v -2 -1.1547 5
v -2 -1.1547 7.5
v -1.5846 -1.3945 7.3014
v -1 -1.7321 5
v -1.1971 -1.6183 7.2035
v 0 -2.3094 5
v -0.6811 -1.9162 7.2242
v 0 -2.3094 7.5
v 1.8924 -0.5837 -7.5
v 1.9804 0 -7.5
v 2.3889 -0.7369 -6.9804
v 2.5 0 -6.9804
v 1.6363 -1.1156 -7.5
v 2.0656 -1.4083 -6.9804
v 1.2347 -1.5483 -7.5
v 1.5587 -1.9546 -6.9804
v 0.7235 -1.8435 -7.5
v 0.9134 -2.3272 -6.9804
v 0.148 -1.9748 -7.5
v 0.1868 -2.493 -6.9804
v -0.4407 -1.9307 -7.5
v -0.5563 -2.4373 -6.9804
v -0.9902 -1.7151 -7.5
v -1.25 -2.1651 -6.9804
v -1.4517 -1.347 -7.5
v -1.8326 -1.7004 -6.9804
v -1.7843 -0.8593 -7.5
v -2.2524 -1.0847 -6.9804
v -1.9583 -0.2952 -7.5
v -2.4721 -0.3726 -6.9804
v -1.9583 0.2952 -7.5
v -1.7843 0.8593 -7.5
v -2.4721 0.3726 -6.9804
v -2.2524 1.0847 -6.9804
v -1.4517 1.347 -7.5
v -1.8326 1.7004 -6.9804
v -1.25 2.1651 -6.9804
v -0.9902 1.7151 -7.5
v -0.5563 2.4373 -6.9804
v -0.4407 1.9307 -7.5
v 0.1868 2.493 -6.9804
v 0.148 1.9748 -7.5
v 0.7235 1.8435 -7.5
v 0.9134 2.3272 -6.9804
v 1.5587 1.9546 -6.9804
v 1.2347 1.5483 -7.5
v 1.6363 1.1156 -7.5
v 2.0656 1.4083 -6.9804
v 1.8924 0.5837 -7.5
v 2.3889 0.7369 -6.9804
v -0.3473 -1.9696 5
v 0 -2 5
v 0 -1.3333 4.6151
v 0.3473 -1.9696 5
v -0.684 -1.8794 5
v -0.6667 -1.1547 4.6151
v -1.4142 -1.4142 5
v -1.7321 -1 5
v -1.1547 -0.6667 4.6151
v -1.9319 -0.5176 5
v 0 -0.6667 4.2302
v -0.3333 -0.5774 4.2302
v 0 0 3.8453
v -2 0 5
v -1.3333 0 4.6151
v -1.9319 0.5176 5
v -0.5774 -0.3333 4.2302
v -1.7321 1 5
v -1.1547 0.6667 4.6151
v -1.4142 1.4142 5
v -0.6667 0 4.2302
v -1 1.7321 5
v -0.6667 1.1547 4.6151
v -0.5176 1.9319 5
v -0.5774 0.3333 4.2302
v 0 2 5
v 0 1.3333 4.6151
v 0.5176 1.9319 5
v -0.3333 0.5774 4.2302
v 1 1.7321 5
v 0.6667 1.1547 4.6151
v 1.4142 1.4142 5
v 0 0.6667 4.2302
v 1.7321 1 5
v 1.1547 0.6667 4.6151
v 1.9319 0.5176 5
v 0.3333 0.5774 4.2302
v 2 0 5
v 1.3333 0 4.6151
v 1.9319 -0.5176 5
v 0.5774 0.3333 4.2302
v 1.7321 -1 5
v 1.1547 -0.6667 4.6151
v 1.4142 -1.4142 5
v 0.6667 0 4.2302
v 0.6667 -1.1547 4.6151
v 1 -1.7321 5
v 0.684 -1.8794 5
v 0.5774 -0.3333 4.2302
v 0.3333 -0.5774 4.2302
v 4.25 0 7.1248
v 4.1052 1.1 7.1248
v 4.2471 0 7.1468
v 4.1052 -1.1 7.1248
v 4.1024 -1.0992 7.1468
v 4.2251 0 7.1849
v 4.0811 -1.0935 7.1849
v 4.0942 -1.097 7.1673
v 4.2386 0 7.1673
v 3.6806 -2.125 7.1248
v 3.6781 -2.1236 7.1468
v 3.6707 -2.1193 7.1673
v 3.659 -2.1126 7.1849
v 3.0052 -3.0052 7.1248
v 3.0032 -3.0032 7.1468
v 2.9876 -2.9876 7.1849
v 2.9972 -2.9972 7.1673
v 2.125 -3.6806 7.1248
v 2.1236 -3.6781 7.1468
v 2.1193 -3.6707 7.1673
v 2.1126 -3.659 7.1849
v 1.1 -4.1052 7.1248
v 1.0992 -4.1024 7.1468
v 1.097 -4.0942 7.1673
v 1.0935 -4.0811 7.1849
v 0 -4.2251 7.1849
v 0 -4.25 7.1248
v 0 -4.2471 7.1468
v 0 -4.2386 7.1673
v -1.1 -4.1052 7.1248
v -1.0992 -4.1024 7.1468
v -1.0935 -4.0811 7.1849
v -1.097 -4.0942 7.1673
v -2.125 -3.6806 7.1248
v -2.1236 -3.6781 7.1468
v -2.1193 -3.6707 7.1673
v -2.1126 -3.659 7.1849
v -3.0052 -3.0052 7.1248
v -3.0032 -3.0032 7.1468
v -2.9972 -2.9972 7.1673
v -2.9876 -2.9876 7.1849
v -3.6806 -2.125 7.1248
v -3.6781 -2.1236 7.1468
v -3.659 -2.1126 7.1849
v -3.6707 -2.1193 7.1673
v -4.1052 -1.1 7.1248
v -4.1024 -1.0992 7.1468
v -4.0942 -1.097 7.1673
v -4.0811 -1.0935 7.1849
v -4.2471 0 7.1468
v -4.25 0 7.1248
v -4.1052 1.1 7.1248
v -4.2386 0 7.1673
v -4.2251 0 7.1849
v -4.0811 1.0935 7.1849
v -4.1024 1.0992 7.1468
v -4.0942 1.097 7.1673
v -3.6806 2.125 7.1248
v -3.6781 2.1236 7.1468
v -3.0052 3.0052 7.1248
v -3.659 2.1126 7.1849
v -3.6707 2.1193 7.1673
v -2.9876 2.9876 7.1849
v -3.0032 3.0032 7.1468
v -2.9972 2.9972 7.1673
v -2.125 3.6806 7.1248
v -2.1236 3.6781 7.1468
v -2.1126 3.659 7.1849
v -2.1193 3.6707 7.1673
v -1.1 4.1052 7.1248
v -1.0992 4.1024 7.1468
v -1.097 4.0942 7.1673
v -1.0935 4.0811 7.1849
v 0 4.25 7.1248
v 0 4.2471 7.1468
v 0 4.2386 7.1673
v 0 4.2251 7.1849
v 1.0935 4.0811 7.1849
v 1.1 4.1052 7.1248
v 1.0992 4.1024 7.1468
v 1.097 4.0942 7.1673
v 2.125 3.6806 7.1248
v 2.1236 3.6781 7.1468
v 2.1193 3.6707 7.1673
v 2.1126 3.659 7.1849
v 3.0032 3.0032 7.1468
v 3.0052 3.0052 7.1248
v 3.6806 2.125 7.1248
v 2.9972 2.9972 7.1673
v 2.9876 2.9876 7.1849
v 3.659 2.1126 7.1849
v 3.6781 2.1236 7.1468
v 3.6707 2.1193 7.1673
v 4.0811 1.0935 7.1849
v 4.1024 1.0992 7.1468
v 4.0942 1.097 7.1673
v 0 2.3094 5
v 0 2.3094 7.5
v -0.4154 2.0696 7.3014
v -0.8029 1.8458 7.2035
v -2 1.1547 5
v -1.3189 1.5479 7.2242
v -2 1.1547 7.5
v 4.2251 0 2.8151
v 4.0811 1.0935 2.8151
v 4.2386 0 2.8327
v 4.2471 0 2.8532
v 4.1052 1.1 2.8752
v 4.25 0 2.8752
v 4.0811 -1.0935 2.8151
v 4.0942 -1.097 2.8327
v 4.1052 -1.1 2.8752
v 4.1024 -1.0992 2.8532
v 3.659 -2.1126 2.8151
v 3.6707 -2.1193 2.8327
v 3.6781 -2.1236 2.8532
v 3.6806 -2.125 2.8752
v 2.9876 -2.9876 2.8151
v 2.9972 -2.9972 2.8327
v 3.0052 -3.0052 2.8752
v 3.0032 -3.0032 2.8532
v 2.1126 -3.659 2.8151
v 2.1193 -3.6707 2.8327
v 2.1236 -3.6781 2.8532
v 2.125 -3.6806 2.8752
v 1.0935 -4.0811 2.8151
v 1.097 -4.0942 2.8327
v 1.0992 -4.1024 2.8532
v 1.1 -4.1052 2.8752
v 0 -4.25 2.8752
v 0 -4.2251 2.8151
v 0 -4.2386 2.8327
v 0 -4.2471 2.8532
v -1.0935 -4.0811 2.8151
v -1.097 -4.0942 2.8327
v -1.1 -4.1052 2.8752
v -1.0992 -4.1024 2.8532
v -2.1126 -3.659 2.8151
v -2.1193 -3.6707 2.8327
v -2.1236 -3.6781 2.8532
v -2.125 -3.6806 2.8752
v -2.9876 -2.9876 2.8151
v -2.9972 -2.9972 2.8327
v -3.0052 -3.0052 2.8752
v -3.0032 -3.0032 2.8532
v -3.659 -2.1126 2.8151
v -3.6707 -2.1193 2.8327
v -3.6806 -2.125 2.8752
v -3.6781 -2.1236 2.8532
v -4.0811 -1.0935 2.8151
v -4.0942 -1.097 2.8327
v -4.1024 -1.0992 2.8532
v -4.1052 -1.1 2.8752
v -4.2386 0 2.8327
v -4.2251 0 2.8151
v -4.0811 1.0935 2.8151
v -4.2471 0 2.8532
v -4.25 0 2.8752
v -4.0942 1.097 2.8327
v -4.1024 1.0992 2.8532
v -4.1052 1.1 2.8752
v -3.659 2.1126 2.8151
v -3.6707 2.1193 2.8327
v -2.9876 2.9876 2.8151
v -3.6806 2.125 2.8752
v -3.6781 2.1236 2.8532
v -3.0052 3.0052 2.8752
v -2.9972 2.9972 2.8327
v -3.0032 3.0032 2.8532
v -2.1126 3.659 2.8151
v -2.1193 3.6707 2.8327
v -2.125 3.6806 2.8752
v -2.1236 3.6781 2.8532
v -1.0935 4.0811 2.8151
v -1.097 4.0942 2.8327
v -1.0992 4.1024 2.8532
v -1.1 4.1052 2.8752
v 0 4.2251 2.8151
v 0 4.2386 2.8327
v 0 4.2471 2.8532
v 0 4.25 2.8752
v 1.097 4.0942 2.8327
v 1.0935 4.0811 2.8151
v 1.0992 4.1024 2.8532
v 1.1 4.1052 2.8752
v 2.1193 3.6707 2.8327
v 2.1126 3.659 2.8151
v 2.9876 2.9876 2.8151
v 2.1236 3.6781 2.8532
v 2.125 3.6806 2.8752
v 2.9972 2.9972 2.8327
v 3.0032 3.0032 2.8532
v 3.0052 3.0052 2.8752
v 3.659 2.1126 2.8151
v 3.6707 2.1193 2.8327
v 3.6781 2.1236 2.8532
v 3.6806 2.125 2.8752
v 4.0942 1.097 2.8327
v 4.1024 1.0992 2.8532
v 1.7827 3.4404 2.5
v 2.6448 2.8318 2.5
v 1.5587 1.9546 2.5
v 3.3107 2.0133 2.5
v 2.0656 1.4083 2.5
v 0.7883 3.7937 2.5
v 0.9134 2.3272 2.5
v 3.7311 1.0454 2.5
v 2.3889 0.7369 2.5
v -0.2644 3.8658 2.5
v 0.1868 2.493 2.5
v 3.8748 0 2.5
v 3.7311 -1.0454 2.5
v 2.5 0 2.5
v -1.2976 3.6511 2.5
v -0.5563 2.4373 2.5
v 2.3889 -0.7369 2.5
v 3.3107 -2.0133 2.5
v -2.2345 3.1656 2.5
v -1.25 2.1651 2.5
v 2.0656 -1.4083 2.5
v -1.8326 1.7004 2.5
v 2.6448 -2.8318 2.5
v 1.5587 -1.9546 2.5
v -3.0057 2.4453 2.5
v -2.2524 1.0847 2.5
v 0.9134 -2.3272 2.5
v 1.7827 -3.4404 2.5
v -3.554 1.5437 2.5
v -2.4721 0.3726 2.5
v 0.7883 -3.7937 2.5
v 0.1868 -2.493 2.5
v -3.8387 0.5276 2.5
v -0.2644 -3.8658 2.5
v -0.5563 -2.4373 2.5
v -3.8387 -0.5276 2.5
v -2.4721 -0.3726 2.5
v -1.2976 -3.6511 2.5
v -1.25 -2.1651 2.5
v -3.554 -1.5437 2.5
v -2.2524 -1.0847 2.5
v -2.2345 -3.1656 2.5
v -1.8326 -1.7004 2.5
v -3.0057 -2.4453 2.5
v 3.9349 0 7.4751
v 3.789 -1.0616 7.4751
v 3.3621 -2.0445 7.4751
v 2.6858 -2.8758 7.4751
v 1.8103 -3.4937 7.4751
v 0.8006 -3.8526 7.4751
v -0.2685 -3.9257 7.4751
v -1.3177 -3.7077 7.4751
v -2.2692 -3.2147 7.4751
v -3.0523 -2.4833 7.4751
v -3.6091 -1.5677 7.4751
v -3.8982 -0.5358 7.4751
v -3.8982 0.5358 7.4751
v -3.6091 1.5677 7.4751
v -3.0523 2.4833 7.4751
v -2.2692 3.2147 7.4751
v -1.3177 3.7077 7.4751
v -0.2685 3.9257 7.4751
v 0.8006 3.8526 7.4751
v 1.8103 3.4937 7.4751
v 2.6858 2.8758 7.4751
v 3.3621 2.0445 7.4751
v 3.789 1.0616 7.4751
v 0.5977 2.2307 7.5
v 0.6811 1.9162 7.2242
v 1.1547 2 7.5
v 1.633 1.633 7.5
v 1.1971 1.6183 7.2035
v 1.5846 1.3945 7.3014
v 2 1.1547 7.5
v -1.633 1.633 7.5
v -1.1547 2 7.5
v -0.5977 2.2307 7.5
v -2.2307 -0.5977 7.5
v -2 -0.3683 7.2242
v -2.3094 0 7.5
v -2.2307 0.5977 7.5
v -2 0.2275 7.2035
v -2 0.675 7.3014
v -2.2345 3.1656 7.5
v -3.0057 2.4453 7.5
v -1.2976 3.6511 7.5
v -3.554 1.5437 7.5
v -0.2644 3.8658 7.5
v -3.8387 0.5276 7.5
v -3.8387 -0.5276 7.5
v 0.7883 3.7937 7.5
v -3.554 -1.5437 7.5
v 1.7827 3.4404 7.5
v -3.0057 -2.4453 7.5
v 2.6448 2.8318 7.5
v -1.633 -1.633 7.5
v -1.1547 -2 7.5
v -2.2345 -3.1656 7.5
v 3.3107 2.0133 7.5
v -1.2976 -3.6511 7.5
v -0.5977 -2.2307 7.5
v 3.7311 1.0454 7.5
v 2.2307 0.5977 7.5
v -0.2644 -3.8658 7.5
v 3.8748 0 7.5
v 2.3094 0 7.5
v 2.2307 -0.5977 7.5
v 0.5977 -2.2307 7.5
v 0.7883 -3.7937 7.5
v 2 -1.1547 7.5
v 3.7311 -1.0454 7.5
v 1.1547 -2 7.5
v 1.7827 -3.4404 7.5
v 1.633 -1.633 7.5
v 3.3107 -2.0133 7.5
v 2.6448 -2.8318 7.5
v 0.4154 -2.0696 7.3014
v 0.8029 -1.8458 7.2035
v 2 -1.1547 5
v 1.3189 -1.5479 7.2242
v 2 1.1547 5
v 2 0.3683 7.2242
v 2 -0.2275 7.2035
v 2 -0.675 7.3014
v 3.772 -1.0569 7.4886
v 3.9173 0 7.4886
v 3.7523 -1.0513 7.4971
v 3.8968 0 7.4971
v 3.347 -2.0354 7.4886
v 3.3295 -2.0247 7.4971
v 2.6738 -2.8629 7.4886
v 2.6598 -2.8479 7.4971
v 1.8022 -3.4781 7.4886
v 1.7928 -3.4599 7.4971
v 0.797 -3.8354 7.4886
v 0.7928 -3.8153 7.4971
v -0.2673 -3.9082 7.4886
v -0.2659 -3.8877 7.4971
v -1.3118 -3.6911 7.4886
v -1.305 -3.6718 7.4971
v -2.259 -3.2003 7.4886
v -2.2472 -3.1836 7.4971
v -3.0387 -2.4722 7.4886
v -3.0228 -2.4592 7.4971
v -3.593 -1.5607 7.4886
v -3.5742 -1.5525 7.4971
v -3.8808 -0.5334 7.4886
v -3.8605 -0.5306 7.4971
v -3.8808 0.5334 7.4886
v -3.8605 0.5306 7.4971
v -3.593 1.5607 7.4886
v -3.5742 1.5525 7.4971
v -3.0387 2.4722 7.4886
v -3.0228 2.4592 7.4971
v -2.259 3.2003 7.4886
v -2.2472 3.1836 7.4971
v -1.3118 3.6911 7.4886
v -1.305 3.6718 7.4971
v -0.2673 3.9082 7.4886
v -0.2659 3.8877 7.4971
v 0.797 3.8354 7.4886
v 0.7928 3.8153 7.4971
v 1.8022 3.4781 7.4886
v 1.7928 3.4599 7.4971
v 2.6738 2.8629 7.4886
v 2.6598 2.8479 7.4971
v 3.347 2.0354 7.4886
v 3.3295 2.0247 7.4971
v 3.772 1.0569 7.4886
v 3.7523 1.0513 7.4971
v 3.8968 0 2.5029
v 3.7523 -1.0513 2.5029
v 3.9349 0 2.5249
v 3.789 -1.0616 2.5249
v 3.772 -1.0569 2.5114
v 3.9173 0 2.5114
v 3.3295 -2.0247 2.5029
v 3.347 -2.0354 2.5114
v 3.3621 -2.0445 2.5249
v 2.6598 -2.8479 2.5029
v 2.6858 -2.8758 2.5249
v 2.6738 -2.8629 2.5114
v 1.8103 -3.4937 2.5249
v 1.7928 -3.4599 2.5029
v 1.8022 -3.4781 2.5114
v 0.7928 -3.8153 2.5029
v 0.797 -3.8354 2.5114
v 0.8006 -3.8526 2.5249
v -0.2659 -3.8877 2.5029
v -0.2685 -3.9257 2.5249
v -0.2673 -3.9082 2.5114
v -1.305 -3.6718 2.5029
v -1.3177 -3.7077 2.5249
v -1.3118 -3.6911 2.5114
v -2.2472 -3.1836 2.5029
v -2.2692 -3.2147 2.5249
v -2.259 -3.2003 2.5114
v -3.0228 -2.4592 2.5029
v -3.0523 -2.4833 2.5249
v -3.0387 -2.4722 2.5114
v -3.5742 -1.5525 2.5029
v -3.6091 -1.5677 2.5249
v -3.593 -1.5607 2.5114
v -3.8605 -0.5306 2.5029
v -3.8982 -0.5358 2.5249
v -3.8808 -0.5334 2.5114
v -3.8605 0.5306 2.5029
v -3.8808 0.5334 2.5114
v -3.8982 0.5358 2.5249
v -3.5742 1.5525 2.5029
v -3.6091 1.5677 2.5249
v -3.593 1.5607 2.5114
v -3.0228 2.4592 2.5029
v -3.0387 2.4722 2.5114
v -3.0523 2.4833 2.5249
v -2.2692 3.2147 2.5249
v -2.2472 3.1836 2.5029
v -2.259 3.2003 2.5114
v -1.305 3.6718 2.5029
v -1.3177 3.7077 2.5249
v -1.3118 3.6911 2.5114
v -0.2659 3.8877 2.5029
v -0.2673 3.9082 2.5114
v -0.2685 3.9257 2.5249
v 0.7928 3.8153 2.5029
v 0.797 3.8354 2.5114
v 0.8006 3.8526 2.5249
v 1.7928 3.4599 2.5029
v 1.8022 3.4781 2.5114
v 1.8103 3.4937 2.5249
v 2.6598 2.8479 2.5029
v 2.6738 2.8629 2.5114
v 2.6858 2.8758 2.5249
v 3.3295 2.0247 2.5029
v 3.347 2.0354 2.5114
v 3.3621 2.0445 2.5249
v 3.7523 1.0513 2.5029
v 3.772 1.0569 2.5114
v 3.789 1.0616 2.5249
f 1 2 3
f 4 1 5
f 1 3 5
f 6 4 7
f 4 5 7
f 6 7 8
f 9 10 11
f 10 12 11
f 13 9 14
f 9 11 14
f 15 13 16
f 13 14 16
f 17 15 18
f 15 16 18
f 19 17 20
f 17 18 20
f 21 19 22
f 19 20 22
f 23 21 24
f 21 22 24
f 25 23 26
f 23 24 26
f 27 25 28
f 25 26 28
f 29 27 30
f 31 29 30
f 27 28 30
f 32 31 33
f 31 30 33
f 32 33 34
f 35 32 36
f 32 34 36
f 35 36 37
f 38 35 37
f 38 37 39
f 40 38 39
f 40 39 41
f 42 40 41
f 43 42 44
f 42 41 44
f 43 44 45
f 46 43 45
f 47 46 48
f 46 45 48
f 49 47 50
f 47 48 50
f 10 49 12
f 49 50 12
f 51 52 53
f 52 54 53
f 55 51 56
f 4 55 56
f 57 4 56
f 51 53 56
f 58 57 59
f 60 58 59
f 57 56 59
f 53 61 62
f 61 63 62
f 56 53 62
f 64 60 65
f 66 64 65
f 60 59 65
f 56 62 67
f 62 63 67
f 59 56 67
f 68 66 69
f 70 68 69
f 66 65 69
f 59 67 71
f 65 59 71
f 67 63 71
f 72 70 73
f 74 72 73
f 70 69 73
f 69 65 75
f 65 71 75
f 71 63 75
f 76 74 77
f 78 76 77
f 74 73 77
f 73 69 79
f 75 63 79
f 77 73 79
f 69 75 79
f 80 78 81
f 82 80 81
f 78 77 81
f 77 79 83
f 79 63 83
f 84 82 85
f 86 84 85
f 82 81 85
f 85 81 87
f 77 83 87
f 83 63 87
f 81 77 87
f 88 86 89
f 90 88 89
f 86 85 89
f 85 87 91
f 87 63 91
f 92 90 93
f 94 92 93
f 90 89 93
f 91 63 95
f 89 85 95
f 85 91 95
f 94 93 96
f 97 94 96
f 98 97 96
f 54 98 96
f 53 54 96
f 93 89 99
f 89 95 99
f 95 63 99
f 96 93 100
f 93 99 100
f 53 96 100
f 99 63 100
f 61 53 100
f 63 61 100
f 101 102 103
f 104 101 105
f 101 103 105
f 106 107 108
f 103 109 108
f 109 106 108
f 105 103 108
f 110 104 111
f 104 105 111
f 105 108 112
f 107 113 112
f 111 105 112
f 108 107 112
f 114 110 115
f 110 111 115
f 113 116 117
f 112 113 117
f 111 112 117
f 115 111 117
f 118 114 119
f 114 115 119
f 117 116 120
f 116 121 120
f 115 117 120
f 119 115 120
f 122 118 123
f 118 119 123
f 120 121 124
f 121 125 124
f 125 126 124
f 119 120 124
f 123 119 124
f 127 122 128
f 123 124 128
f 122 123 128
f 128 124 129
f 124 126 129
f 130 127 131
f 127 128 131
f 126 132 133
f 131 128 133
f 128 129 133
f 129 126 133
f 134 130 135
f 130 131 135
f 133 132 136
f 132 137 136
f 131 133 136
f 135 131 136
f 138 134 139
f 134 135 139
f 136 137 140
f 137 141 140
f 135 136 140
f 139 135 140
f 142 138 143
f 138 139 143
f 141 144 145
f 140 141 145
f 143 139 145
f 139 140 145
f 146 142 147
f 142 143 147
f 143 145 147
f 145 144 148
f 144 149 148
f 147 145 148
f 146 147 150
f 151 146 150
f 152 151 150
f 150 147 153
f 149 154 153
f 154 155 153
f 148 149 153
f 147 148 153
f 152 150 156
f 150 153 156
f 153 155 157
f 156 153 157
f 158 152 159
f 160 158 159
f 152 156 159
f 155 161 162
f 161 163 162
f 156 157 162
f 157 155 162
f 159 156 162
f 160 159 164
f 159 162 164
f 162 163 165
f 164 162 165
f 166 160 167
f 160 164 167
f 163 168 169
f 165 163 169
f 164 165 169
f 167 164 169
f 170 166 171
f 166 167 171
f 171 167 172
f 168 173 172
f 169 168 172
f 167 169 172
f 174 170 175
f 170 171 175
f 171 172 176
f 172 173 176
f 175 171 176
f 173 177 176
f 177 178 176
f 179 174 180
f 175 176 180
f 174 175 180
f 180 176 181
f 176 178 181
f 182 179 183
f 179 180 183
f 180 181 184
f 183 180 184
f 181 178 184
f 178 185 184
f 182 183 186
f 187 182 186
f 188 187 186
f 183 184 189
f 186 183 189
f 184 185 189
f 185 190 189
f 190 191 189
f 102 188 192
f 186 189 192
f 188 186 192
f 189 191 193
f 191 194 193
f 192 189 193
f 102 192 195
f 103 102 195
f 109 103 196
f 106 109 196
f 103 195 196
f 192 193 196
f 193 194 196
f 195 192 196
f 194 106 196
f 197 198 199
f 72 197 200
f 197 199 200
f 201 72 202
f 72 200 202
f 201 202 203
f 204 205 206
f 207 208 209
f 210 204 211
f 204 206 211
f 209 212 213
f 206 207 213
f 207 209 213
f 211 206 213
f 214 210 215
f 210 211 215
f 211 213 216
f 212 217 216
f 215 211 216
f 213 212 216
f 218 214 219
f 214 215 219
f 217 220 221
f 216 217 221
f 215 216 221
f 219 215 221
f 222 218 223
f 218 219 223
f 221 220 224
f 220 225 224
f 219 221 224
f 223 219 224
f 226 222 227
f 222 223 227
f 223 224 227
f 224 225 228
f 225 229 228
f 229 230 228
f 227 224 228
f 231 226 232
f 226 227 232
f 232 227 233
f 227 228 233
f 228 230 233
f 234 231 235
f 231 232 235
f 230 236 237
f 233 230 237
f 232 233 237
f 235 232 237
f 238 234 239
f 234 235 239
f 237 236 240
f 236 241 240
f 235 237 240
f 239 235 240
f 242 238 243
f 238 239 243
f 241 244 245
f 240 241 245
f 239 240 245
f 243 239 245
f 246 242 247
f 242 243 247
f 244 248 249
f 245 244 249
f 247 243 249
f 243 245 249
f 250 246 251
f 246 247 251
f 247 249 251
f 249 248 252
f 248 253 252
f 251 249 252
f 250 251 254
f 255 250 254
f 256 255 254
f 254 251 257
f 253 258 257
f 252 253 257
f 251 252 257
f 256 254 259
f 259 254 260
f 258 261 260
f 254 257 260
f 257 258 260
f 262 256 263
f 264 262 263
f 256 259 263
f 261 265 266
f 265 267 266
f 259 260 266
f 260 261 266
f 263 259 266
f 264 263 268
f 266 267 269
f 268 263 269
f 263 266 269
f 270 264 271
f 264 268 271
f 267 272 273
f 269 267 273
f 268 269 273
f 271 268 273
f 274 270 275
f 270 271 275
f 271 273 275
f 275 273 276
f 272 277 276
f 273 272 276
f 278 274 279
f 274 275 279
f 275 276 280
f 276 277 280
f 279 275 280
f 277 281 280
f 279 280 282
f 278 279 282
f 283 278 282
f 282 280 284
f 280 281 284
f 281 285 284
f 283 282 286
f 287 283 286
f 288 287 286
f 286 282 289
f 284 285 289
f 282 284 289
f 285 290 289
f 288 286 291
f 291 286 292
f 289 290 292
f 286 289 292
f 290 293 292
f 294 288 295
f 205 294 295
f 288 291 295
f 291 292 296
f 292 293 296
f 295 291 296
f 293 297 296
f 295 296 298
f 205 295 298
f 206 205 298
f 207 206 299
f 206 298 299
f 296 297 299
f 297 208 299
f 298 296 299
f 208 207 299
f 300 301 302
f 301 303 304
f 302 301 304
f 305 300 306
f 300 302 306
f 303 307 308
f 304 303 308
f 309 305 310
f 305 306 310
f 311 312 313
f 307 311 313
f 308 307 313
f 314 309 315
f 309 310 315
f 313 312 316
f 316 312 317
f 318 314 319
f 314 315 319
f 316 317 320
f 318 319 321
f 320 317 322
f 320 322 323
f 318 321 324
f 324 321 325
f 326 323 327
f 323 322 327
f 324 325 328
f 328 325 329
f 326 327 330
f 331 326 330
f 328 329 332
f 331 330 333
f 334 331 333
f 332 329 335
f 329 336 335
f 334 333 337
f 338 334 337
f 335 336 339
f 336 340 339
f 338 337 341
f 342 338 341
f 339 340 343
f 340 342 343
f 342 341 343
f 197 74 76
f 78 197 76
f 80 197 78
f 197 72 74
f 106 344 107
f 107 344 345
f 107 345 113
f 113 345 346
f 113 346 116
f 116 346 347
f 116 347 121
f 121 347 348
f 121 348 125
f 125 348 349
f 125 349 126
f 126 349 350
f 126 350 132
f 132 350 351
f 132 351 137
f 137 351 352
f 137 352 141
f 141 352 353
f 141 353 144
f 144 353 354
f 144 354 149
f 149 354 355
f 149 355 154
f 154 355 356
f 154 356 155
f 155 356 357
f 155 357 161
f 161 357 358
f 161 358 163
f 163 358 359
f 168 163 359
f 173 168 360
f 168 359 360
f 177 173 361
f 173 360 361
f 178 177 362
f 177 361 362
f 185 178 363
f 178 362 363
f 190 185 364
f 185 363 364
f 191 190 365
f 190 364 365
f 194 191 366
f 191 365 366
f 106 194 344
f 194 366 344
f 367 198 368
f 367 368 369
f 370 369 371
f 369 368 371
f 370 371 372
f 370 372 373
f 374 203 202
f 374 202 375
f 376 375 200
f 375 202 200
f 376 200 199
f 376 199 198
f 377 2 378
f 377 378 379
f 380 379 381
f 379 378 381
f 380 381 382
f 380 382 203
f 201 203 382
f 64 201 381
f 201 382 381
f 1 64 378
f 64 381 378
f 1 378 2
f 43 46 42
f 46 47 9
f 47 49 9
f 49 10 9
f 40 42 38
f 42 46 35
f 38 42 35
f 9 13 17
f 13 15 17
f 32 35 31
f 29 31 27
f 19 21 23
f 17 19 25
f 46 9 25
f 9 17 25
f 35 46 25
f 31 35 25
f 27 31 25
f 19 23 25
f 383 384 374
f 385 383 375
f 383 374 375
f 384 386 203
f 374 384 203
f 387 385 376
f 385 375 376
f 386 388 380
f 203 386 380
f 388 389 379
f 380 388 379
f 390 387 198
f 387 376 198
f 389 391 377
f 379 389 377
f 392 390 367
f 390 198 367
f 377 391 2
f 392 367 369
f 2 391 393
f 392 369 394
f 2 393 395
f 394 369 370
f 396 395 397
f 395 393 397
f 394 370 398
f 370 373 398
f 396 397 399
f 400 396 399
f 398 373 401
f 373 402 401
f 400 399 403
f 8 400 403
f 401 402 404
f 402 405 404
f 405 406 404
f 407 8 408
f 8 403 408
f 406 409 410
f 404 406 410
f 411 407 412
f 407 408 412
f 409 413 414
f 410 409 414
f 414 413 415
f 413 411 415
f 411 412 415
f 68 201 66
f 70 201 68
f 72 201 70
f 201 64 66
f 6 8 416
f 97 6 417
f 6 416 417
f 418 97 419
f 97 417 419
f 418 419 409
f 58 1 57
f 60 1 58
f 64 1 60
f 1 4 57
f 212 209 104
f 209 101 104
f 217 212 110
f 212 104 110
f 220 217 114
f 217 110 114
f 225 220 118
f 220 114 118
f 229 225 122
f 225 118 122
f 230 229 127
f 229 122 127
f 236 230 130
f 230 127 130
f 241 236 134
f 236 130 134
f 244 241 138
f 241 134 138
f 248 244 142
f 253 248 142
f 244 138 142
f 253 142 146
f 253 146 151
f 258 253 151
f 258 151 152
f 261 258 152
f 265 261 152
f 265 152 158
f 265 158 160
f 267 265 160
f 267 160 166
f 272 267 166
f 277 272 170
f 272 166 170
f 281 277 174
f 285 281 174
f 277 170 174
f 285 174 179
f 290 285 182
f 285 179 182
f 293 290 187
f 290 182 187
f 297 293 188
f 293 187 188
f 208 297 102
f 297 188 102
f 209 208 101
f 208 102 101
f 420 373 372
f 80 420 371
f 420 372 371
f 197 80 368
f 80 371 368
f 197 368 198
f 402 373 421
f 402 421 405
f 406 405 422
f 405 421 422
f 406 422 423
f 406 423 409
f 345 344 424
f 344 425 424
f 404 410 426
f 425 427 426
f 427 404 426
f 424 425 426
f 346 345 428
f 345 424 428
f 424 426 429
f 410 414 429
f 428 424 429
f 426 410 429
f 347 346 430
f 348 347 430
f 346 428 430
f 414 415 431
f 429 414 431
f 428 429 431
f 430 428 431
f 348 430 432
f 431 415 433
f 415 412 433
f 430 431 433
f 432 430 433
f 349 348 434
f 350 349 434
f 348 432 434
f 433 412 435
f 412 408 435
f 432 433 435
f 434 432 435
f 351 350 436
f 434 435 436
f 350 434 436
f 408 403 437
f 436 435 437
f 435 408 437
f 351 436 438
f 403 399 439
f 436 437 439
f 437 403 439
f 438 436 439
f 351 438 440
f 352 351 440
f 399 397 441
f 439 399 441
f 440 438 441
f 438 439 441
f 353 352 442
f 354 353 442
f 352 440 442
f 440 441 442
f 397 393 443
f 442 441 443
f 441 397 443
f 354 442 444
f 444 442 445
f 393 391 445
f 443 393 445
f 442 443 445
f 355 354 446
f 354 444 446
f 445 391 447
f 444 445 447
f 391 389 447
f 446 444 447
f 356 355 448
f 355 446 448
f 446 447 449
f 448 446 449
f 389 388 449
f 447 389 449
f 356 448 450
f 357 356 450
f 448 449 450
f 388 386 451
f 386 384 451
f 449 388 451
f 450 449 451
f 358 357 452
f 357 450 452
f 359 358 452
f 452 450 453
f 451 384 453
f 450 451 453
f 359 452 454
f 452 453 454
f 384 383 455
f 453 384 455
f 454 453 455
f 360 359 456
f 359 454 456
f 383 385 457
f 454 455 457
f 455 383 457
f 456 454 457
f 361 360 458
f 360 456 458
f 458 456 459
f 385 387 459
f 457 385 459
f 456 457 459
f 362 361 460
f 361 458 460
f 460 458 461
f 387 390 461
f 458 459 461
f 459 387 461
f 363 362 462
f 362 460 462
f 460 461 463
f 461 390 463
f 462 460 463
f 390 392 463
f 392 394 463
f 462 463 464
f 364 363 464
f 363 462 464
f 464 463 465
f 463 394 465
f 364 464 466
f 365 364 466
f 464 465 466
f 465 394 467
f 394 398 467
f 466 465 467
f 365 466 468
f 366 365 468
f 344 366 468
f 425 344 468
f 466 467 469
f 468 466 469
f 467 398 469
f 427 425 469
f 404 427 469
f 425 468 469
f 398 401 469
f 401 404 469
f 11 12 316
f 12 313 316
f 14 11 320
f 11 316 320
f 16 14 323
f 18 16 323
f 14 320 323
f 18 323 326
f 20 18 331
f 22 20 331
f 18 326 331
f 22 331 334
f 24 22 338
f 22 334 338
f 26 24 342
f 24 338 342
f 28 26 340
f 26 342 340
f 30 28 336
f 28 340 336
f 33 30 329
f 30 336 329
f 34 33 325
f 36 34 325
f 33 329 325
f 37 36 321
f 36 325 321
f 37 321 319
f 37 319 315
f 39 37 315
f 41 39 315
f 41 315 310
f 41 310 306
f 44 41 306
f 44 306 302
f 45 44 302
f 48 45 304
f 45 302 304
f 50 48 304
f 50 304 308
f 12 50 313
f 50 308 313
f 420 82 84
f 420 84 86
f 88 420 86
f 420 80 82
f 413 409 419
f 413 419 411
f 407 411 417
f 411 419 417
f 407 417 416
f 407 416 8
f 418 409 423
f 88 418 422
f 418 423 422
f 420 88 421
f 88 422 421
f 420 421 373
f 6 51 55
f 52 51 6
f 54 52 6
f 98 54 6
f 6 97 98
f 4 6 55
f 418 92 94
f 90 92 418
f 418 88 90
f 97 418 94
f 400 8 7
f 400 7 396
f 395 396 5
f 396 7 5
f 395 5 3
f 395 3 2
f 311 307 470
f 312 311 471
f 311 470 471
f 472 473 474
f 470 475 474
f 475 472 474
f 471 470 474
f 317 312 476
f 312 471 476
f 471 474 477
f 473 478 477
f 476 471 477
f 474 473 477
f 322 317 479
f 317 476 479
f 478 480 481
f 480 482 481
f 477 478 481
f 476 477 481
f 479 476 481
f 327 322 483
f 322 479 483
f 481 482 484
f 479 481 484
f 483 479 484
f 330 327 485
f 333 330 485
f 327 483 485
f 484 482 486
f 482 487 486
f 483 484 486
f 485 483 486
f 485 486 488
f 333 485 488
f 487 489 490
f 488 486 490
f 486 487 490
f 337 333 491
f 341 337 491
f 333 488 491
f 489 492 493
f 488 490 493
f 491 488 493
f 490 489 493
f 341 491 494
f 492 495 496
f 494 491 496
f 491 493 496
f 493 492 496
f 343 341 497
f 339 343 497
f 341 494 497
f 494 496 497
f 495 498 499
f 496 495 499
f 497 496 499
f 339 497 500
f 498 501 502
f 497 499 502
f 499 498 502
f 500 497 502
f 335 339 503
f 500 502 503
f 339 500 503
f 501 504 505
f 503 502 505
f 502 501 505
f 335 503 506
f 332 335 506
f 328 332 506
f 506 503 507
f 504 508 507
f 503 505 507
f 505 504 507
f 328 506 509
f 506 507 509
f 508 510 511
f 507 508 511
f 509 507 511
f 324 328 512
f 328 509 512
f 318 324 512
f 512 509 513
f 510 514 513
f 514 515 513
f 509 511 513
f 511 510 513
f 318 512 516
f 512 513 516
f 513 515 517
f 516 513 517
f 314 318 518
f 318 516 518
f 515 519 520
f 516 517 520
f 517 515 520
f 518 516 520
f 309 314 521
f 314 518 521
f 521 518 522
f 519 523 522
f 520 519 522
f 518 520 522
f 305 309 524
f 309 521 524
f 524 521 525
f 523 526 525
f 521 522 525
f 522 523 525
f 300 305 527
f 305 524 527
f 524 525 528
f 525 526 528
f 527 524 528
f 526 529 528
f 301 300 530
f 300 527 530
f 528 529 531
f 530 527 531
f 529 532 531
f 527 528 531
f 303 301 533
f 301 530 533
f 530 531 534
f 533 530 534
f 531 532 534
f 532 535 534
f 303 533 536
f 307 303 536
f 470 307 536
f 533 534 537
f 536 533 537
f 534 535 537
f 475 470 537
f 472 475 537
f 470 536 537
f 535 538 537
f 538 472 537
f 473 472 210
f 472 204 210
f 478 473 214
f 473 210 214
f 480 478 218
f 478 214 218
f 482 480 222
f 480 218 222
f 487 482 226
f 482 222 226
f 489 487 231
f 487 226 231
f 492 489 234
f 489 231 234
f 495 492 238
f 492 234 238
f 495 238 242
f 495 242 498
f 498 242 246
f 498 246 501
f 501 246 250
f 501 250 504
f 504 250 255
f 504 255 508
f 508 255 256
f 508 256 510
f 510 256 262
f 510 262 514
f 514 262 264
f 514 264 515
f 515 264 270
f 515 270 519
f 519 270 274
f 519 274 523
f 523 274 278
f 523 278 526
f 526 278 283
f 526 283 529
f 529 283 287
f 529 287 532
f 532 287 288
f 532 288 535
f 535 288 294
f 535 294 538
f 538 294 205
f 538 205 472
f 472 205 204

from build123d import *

# Parameters (mm, degrees)
CUT_EXTRUDE1_DEPTH = 2.5


with BuildPart() as part:
    # Sketch3 → Revolve1 (revolve)
    with BuildSketch(Plane(origin=(0, 0, 0), x_dir=(0, 0, -1), z_dir=(1, 0, 0)), mode=Mode.PRIVATE) as revolve1_sk:
        with BuildLine():
            Line((-7.5, 3.874791847), (-7.5, 2))
            Line((-7.5, 2), (-5, 2))
            Line((-5, 2), (-5, 0))
            Line((-5, 0), (7.5, 0))
            Line((7.5, 0), (7.5, 1.980384758))
            Line((7.5, 1.980384758), (6.980384758, 2.5))
            Line((6.980384758, 2.5), (-2.5, 2.5))
            Line((-2.5, 2.5), (-2.5, 3.874791847))
            ThreePointArc((-2.5, 3.874791847), (-2.50647024, 3.907319939), (-2.524895924, 3.934895924))
            Line((-2.524895924, 3.934895924), (-2.815104076, 4.225104076))
            ThreePointArc((-2.815104076, 4.225104076), (-2.842680061, 4.24352976), (-2.875208153, 4.25))
            Line((-2.875208153, 4.25), (-7.124791847, 4.25))
            ThreePointArc((-7.124791847, 4.25), (-7.157319939, 4.24352976), (-7.184895924, 4.225104076))
            Line((-7.184895924, 4.225104076), (-7.475104076, 3.934895924))
            ThreePointArc((-7.475104076, 3.934895924), (-7.49352976, 3.907319939), (-7.5, 3.874791847))
        make_face()
    revolve(revolve1_sk.sketch.rotate(Axis((0, 0, 7.5), (0, 0, -1)), 90), axis=Axis((0, 0, 7.5), (0, 0, -1)))

    # Sketch4 → Cut-Extrude1 (cut)
    with BuildSketch(Plane.XY.offset(7.5)):
        Polygon((0, 2.309401077), (-2, 1.154700538), (-2, -1.154700538), (0, -2.309401077), (2, -1.154700538), (2, 1.154700538), align=None)
    extrude(amount=-CUT_EXTRUDE1_DEPTH, mode=Mode.SUBTRACT)

    # Cut-Extrude2 cone 1 section (through the dimple's axis) → Cut-Extrude2 (revolve, cut)
    with BuildSketch(Plane(origin=(0, 0, 7.5), x_dir=(0, -1, 0), z_dir=(1, 0, 0))):
        Polygon((0, 0), (2.309401077, 0), (0, 2.309401077), align=None)
    revolve(axis=Axis((0, 0, 7.5), (0, 0, -1)), mode=Mode.SUBTRACT)

    # Cut-Extrude3 cone 1 section (through the dimple's axis) → Cut-Extrude3 (revolve, cut)
    with BuildSketch(Plane(origin=(0, 0, 5), x_dir=(0, -1, 0), z_dir=(1, 0, 0))):
        Polygon((0, 0), (2, 0), (0, 1.154700538), align=None)
    revolve(axis=Axis((0, 0, 5), (0, 0, -1)), mode=Mode.SUBTRACT)


solid = part.part
